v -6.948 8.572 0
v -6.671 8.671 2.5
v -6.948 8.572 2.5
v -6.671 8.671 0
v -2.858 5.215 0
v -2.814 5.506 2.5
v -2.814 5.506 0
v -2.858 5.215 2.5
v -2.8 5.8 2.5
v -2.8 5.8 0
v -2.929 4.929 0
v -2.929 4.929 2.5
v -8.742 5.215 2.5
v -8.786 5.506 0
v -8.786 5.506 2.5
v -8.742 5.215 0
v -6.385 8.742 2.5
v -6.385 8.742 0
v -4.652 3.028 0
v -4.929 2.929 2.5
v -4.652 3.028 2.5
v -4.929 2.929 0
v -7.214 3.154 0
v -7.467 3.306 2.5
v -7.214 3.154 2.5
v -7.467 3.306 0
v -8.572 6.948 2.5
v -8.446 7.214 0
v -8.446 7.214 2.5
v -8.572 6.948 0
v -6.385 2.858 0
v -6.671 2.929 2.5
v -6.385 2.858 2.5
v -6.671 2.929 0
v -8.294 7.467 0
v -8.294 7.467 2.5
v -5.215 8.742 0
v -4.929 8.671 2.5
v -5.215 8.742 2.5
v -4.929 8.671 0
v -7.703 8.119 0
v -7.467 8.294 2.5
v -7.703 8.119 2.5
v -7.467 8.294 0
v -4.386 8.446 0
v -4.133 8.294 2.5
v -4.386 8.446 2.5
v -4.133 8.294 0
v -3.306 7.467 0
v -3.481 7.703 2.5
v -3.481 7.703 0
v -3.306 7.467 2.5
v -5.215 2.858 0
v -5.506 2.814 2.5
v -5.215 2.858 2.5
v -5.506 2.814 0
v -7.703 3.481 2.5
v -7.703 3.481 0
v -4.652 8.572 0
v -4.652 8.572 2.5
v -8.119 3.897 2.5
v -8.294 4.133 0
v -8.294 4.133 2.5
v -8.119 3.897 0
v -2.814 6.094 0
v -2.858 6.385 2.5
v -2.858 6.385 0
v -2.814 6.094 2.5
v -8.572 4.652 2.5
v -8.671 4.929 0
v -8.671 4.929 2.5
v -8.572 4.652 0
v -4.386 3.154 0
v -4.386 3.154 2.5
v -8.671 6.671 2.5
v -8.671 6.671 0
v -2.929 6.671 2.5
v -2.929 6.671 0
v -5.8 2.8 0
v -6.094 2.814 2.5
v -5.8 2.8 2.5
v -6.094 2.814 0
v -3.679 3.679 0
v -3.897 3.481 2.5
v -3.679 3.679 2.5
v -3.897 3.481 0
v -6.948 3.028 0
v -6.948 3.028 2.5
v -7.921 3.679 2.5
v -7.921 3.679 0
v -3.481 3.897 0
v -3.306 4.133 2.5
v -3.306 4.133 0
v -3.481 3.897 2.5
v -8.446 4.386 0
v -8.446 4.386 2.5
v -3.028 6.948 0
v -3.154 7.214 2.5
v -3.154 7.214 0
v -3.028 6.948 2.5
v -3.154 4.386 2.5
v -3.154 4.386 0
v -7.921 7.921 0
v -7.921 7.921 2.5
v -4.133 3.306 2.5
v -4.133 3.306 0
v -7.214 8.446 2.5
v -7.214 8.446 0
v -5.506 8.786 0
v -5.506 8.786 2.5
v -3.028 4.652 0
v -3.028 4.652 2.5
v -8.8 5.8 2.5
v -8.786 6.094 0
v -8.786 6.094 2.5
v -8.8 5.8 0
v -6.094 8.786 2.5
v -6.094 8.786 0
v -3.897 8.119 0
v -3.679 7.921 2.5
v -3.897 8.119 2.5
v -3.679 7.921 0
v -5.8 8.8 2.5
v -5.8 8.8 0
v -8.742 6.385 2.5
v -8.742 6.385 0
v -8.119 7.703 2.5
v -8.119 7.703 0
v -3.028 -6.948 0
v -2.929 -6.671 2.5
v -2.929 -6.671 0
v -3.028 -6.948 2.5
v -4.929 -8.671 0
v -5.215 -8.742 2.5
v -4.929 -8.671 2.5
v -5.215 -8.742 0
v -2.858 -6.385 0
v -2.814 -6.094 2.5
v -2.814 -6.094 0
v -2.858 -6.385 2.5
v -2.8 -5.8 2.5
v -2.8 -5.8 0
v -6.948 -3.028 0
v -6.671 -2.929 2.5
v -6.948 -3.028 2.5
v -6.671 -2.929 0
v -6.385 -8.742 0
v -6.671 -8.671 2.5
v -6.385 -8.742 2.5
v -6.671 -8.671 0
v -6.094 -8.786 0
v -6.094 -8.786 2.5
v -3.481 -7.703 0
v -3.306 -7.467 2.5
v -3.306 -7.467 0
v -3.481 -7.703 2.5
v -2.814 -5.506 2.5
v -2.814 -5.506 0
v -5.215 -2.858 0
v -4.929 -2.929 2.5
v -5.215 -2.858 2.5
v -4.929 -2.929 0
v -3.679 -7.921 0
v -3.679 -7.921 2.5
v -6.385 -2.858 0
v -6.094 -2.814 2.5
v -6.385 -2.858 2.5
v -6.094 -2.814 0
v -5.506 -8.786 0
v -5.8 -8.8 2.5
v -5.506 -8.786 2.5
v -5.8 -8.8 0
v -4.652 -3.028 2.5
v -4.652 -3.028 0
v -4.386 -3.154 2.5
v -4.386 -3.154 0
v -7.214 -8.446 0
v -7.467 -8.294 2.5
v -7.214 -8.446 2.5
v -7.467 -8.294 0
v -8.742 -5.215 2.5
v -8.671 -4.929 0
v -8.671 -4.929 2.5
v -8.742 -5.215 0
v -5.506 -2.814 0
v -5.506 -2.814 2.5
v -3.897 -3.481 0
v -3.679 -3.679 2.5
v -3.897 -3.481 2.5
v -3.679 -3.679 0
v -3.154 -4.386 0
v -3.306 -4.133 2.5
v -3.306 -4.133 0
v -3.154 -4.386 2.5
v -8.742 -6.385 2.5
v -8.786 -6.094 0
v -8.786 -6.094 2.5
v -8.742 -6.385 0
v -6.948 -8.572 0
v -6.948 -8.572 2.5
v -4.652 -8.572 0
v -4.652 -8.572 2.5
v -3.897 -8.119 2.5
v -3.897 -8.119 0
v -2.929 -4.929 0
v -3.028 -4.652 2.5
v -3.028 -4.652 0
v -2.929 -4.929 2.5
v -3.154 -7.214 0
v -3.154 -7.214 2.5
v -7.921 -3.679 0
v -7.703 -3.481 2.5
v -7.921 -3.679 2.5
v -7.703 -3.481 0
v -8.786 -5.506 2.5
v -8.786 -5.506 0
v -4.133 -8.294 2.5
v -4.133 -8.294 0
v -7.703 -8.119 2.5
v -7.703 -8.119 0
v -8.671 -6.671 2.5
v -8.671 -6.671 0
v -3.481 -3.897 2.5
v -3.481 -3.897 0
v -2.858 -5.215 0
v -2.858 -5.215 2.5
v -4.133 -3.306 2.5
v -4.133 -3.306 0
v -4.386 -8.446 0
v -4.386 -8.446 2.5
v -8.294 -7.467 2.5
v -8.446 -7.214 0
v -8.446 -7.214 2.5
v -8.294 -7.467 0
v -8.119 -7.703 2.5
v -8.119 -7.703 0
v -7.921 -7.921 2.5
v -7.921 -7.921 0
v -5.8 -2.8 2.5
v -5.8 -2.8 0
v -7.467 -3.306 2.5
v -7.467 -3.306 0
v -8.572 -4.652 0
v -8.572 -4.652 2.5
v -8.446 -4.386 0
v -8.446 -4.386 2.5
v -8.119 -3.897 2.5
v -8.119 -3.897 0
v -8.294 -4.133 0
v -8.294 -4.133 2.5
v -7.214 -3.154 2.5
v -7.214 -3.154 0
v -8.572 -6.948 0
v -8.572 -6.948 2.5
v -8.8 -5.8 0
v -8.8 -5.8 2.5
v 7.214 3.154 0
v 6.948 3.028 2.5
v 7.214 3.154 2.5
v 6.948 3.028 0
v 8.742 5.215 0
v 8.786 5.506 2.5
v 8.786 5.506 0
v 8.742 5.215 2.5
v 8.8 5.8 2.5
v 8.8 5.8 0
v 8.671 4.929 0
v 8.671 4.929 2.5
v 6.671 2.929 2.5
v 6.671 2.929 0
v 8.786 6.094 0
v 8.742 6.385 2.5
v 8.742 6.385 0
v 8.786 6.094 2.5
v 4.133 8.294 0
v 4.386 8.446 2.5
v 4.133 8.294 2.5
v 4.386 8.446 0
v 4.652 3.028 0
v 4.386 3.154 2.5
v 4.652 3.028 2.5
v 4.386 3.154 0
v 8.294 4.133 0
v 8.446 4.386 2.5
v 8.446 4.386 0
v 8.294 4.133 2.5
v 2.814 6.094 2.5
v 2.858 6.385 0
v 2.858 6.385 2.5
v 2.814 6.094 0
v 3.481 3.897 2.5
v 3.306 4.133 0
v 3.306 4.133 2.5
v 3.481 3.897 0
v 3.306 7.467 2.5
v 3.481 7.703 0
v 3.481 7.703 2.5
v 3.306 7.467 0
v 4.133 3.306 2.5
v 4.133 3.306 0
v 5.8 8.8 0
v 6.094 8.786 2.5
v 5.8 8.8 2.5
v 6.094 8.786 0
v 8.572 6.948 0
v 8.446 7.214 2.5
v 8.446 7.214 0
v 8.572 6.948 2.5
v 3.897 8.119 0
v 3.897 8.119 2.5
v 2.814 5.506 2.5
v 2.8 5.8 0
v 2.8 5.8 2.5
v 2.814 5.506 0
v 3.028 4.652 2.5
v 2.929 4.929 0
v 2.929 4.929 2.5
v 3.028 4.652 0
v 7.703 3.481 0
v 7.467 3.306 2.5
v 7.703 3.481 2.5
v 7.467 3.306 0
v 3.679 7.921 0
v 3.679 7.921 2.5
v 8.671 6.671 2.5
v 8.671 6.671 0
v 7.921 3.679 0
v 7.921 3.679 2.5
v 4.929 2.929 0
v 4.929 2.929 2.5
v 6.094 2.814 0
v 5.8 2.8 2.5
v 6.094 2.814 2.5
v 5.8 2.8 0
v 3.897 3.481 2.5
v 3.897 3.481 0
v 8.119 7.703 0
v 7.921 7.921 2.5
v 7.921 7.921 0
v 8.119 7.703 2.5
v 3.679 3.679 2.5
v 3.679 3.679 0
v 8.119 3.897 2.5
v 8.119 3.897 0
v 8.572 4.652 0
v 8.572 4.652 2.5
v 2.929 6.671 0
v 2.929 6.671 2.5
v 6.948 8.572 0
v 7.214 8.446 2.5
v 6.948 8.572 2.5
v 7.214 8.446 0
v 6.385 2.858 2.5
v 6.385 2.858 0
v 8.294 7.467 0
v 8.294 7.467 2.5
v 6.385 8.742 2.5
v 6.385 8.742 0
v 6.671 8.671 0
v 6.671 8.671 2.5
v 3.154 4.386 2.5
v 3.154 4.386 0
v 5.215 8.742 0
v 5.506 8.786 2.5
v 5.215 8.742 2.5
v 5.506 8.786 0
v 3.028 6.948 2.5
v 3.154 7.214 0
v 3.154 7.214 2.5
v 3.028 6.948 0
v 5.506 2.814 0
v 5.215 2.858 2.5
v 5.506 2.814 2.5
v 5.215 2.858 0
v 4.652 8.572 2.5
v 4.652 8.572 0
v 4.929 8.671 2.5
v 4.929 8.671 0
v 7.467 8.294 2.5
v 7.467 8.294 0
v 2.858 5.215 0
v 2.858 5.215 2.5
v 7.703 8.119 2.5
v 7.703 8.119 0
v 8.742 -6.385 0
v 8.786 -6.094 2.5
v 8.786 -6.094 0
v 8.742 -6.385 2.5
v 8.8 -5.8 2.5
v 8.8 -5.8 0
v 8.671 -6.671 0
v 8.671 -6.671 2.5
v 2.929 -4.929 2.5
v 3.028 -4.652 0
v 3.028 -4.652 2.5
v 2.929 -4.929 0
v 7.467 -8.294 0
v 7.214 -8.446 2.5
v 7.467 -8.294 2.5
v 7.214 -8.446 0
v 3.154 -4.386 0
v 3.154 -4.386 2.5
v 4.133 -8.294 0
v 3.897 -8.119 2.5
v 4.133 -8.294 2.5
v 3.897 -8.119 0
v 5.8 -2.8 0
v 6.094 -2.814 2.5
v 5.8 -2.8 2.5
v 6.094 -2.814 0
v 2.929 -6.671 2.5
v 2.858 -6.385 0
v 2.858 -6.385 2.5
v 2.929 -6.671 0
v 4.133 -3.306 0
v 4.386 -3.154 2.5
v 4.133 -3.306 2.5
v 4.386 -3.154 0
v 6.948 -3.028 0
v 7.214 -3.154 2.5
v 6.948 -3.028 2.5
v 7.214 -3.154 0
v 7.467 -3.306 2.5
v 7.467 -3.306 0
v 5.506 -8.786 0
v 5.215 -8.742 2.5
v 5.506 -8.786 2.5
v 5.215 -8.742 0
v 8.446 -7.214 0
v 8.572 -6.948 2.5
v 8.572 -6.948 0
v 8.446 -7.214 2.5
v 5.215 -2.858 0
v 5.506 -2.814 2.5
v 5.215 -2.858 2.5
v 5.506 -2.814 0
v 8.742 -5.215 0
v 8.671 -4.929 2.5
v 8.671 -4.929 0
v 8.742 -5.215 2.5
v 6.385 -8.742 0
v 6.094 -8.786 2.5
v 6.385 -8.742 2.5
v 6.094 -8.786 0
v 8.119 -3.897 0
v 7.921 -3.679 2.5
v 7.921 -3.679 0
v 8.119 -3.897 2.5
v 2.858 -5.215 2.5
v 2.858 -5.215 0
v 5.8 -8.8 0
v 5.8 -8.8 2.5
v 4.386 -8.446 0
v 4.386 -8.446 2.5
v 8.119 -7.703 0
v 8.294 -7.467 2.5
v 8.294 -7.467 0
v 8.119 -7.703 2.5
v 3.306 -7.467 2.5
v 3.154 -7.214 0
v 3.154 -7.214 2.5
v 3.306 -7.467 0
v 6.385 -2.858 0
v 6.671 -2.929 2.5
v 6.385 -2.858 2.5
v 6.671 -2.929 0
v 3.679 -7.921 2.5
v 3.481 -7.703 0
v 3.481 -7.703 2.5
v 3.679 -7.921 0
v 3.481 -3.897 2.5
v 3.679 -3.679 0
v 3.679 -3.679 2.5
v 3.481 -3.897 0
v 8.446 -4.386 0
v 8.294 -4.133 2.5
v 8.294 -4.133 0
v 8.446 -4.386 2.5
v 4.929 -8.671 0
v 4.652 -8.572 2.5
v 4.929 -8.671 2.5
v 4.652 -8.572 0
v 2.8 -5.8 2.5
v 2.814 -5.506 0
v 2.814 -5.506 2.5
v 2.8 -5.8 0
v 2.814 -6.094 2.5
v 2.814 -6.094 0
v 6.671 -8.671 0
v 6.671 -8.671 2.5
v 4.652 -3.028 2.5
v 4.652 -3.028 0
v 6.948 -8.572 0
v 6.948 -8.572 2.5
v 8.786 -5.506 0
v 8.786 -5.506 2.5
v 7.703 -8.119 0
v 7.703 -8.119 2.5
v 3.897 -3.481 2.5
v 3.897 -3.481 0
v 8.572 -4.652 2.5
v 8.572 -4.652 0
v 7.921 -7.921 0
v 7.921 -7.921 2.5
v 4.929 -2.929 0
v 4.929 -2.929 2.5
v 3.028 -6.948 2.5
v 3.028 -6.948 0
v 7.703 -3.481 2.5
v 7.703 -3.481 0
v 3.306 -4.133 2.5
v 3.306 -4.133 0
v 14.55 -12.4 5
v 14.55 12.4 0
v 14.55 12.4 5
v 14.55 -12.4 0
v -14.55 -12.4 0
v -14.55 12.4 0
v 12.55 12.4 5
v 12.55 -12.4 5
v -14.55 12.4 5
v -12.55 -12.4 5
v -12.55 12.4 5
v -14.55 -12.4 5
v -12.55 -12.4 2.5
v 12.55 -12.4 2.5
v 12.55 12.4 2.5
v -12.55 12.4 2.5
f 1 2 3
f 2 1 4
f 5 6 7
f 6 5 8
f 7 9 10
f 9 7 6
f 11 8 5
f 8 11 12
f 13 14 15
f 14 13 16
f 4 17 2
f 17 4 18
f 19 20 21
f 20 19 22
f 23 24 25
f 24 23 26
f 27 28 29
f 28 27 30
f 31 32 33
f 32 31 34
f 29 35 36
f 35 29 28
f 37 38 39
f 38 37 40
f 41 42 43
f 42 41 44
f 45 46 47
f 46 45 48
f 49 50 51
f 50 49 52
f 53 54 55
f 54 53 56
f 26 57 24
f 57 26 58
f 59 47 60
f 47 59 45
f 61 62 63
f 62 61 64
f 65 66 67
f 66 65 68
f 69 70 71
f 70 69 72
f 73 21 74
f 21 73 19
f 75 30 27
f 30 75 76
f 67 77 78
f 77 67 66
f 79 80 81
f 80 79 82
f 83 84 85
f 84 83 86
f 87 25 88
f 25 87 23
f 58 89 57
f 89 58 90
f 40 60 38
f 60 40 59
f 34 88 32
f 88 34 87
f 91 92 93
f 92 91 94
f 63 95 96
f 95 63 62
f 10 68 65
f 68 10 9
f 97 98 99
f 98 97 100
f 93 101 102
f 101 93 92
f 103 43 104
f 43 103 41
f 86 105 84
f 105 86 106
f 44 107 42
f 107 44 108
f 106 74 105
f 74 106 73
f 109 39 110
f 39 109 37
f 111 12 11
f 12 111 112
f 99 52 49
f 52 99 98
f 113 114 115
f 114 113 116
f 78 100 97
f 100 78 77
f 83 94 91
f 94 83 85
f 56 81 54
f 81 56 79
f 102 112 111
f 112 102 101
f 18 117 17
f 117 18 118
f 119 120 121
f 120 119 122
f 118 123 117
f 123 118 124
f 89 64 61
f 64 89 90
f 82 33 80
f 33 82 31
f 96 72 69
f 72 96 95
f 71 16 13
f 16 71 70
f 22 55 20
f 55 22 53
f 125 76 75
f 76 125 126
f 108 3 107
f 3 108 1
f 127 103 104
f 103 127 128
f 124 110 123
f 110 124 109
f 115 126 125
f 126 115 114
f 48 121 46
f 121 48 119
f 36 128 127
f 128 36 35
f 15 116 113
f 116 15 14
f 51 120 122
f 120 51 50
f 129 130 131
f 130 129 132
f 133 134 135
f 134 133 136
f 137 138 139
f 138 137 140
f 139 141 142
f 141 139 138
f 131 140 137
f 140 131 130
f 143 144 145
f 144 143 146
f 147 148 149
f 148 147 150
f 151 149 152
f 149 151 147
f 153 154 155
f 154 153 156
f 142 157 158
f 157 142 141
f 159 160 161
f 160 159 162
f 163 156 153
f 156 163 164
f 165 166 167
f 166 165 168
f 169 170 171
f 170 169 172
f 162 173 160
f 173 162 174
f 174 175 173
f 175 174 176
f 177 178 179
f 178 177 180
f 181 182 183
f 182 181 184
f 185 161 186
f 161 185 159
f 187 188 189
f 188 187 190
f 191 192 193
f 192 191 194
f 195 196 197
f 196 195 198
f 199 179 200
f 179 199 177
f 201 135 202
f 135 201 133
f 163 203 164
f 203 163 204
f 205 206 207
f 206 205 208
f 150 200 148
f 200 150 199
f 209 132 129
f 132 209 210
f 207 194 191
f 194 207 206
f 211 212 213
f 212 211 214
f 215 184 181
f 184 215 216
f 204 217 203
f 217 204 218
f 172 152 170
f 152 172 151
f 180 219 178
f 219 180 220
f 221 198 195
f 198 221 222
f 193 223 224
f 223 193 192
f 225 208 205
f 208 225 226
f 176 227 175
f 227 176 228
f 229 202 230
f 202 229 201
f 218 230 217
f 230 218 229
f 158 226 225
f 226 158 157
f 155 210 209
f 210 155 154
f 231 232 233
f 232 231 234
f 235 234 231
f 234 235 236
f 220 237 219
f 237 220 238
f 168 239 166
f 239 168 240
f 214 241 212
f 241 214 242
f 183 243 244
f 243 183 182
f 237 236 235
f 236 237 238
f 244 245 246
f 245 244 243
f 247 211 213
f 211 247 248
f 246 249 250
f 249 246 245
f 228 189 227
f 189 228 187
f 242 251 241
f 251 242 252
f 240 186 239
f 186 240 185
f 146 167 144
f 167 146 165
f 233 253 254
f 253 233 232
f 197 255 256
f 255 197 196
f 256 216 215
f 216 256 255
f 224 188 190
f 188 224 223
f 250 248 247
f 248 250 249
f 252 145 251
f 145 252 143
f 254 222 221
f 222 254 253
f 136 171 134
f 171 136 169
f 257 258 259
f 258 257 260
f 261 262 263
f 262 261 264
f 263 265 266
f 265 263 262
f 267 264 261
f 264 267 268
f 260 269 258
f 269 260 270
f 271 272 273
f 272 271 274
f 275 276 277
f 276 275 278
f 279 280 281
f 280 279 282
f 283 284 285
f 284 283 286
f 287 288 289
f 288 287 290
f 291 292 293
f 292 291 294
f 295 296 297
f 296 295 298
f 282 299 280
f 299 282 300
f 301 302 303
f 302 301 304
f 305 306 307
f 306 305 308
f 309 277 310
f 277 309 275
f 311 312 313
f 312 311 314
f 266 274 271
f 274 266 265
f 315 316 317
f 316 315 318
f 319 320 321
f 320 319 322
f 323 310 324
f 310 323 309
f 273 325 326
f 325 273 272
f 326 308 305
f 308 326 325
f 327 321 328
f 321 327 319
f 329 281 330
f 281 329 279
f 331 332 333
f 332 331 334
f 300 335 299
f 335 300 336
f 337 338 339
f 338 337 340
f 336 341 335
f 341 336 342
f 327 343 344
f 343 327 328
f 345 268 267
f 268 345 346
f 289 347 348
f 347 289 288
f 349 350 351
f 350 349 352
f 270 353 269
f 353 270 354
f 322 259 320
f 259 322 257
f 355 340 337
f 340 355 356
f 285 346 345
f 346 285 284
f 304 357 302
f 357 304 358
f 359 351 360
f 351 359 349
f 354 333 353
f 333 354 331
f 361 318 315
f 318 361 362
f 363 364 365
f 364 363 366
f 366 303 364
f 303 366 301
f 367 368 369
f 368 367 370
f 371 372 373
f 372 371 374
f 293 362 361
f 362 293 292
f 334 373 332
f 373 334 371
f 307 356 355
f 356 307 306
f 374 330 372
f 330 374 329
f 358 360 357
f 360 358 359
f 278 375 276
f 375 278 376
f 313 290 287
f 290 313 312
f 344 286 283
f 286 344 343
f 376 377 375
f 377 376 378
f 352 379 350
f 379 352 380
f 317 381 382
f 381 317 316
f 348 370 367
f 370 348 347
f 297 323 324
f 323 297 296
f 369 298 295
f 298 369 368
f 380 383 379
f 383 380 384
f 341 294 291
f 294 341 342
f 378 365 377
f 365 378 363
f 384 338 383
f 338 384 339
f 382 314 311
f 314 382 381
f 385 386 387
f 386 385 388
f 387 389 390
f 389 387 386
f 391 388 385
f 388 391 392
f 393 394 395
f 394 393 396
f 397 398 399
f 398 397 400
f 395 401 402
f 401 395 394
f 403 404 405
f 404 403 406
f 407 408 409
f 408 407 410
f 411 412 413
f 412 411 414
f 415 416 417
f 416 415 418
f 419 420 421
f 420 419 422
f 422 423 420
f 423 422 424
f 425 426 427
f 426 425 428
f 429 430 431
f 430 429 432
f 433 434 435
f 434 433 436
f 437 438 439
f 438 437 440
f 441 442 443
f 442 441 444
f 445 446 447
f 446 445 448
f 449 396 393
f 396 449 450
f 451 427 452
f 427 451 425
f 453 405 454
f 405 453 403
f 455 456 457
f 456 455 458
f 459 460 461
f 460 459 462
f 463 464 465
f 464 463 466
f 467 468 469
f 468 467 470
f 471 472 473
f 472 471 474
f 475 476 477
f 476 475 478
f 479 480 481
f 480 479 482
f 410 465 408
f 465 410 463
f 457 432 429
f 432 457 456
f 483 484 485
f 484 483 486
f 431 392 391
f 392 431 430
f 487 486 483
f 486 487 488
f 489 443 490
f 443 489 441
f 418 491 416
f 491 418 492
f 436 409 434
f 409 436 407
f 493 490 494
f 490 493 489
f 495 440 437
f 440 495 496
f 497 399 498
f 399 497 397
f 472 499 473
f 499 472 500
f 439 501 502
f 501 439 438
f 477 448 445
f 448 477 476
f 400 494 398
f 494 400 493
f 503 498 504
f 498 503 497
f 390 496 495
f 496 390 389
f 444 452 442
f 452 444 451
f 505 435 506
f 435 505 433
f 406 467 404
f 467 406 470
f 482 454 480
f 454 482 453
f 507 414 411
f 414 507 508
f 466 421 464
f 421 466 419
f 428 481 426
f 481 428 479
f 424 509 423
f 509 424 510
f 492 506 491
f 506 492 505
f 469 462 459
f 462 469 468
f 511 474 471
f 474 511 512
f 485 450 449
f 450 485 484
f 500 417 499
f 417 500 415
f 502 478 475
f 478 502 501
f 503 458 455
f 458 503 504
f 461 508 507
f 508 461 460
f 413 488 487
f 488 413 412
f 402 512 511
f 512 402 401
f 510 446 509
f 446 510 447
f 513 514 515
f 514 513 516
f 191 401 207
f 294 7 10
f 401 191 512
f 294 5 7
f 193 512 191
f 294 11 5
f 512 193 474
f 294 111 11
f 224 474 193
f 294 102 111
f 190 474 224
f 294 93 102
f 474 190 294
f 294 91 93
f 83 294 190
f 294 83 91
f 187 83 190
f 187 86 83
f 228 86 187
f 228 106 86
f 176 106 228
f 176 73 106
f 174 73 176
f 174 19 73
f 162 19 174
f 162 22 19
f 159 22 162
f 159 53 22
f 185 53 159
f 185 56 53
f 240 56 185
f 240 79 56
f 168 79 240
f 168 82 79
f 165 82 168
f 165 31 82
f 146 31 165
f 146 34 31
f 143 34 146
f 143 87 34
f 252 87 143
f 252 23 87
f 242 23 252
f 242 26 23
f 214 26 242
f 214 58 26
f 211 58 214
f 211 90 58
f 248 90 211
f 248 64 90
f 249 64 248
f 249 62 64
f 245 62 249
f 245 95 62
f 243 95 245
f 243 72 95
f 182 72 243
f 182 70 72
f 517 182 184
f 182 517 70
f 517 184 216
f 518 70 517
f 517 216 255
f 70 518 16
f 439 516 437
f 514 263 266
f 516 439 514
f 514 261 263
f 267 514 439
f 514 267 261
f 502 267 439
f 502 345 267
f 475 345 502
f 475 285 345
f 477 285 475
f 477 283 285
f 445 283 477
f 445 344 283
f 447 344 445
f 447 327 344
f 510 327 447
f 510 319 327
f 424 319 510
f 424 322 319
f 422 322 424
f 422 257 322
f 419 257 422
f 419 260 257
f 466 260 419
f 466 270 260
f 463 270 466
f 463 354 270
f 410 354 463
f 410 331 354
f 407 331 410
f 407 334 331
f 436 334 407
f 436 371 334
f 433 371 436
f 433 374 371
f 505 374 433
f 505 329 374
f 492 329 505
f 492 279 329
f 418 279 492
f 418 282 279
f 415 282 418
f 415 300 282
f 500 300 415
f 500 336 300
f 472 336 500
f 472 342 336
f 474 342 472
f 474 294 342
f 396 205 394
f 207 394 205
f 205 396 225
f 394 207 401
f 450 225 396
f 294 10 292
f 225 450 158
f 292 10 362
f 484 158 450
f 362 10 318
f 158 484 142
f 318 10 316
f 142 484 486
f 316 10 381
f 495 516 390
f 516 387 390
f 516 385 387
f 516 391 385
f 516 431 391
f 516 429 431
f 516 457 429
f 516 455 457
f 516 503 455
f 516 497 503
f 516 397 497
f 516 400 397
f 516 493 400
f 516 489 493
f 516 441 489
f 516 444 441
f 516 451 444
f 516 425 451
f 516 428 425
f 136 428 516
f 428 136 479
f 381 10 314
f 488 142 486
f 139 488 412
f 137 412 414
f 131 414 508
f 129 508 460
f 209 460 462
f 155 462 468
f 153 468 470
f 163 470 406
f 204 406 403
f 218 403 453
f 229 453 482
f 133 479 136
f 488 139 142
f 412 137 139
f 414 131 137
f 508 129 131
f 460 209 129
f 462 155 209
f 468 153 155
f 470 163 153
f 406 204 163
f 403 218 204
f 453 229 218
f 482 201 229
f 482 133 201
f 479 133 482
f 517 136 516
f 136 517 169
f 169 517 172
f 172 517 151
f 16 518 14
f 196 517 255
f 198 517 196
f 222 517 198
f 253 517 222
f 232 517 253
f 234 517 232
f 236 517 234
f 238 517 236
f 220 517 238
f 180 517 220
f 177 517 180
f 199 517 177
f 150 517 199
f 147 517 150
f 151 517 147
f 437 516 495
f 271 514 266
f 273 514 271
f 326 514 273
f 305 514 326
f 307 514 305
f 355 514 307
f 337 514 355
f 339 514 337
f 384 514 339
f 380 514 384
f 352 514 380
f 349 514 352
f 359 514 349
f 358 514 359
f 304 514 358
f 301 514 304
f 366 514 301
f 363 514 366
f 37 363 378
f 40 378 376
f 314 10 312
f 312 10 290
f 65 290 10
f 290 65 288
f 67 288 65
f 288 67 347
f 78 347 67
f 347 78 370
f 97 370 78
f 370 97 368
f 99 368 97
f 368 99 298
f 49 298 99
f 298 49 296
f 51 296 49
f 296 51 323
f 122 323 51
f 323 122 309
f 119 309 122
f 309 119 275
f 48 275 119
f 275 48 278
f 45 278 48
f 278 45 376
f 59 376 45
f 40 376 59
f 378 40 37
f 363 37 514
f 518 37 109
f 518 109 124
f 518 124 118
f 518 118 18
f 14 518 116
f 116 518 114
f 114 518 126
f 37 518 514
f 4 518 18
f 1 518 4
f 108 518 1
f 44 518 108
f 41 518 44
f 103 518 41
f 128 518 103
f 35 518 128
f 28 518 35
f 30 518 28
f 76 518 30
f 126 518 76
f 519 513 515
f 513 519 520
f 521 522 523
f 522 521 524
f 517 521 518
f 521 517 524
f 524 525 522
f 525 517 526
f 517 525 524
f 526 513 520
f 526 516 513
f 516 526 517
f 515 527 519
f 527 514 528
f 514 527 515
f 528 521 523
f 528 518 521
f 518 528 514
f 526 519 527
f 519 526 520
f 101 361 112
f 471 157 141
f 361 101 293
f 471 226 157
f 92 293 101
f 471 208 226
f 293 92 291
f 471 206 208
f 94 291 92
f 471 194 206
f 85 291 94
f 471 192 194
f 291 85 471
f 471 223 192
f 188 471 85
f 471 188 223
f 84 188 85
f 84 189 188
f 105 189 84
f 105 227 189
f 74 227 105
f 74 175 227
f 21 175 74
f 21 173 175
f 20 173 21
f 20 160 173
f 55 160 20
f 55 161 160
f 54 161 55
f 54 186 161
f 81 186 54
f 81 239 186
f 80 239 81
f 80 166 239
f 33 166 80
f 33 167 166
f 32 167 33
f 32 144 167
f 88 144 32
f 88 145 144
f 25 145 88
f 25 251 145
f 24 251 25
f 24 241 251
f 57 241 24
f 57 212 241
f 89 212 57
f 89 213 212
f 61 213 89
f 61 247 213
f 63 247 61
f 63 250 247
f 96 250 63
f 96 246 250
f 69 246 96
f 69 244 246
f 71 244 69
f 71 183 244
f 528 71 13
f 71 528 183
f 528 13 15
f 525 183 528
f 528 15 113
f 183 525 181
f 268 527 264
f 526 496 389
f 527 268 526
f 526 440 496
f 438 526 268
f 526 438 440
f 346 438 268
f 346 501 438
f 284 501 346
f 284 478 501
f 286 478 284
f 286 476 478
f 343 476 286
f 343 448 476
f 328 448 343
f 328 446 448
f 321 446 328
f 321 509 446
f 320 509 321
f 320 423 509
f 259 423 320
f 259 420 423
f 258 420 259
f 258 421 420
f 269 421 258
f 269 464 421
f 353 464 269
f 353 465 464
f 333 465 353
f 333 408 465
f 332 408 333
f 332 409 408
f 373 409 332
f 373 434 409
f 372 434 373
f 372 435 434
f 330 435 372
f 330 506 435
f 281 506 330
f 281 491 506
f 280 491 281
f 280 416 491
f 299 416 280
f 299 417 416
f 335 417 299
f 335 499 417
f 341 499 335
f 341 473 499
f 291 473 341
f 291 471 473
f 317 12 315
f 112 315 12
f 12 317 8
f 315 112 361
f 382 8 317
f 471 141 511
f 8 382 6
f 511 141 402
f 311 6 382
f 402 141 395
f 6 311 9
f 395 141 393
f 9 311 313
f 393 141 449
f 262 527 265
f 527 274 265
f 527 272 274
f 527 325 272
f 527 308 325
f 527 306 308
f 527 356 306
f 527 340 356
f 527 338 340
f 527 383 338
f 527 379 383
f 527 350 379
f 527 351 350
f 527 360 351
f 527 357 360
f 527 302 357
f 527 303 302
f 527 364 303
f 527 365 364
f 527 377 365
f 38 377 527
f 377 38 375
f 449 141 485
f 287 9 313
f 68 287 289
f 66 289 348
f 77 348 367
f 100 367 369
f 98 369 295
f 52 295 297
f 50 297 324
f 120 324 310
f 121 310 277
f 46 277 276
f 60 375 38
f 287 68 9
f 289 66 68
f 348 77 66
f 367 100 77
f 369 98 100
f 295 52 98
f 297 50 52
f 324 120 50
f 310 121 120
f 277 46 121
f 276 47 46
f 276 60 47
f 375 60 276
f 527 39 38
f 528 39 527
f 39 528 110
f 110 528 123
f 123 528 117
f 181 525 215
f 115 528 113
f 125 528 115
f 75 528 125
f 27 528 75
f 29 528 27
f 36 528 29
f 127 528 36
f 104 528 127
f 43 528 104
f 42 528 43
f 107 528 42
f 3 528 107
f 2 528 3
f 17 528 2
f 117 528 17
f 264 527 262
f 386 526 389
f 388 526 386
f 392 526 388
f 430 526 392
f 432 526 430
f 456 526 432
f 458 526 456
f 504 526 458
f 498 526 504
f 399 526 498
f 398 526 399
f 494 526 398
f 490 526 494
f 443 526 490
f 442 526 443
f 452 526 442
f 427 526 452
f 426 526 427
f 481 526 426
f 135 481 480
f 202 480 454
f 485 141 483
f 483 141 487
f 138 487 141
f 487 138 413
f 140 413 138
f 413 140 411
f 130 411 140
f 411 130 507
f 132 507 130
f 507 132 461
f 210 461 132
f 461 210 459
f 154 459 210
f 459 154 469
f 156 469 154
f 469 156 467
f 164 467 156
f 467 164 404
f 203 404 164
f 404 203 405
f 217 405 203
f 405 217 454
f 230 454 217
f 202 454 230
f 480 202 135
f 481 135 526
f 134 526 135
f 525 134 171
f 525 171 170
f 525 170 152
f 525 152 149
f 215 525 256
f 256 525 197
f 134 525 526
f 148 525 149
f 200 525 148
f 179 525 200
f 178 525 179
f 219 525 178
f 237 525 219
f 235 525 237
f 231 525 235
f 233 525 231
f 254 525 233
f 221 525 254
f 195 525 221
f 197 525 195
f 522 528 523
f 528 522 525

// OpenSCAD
// Copyright (c) 2026 mmmaxwwwell
// Licensed under CC BY-NC-ND 4.0, https://creativecommons.org/licenses/by-nc-nd/4.0/
// Free for personal use. Commercial use requires a separate license.
//
// Leash hole-punch jig for 1" (25.4mm) Chicago-screw blocks on 24.8mm BioThane.
// Punches a 2x2 square of 6mm holes for 5mm Chicago screws.
// Channel is open-ended along the strap direction so longer straps feed through.

// ===== Strap =====
strap_width      = 24.8;   // mm, BioThane width
strap_thickness  = 2.5;    // mm, BioThane thickness

// ===== Hole pattern =====
// Square of 4 holes for Chicago screws. Holes are 6mm but caps are 10mm,
// so spacing is governed by cap geometry, not hole geometry:
//   3*gap + 2*cap_d = strap_width   →   gap = (24.8 - 20) / 3 = 1.6mm
// Hole center-to-center  = cap_d + gap          = 11.6 mm
// Edge-to-hole center    = gap + cap_d/2        =  6.6 mm
hole_d           = 6.0;    // mm, punch diameter
cap_d            = 10.0;   // mm, Chicago-screw cap diameter
gap              = (strap_width - 2 * cap_d) / 3;   // 1.6 mm
hole_pitch       = cap_d + gap;                     // 11.6 mm, center-to-center
edge_to_center   = gap + cap_d / 2;                 //  6.6 mm

// ===== Jig =====
wall             = 2.0;    // mm, side walls + end padding around hole pattern
jig_thickness    = 2 * strap_thickness;  // 5 mm total
channel_clearance = 0.3;   // mm, sliding fit for the strap in the channel

channel_w        = strap_width + channel_clearance;     // X, across strap
channel_d        = strap_thickness;                     // Z, channel depth

jig_w            = channel_w + 2 * wall;                // X
// Y length: square pattern → same edge-to-hole and hole-to-hole as X,
// so total jig length along the strap = strap_width by construction
// (3*gap + 2*cap_d = strap_width).
jig_l            = strap_width;

eps              = 0.01;

$fn = 64;

module jig() {
    difference() {
        // Solid block, centered in X and Y, sitting on Z=0
        translate([-jig_w/2, -jig_l/2, 0])
            cube([jig_w, jig_l, jig_thickness]);

        // Strap channel: open-ended in Y, runs full length of the jig
        translate([-channel_w/2, -jig_l/2 - eps, -eps])
            cube([channel_w, jig_l + 2*eps, channel_d + eps]);

        // 4 punch-guide holes through the top of the jig.
        // Centers sit at ±hole_pitch/2 in both axes (square pattern, sized
        // for 10mm caps with equal cap-to-cap and cap-to-edge gaps).
        for (x = [-hole_pitch/2, hole_pitch/2])
            for (y = [-hole_pitch/2, hole_pitch/2])
                translate([x, y, -eps])
                    cylinder(d = hole_d, h = jig_thickness + 2*eps);
    }
}

// Flip so the punch-side (top) sits on the build plate — solid flat face
// is on Z=0 for printing; the strap channel faces up.
translate([0, 0, jig_thickness])
    rotate([180, 0, 0])
        jig();
